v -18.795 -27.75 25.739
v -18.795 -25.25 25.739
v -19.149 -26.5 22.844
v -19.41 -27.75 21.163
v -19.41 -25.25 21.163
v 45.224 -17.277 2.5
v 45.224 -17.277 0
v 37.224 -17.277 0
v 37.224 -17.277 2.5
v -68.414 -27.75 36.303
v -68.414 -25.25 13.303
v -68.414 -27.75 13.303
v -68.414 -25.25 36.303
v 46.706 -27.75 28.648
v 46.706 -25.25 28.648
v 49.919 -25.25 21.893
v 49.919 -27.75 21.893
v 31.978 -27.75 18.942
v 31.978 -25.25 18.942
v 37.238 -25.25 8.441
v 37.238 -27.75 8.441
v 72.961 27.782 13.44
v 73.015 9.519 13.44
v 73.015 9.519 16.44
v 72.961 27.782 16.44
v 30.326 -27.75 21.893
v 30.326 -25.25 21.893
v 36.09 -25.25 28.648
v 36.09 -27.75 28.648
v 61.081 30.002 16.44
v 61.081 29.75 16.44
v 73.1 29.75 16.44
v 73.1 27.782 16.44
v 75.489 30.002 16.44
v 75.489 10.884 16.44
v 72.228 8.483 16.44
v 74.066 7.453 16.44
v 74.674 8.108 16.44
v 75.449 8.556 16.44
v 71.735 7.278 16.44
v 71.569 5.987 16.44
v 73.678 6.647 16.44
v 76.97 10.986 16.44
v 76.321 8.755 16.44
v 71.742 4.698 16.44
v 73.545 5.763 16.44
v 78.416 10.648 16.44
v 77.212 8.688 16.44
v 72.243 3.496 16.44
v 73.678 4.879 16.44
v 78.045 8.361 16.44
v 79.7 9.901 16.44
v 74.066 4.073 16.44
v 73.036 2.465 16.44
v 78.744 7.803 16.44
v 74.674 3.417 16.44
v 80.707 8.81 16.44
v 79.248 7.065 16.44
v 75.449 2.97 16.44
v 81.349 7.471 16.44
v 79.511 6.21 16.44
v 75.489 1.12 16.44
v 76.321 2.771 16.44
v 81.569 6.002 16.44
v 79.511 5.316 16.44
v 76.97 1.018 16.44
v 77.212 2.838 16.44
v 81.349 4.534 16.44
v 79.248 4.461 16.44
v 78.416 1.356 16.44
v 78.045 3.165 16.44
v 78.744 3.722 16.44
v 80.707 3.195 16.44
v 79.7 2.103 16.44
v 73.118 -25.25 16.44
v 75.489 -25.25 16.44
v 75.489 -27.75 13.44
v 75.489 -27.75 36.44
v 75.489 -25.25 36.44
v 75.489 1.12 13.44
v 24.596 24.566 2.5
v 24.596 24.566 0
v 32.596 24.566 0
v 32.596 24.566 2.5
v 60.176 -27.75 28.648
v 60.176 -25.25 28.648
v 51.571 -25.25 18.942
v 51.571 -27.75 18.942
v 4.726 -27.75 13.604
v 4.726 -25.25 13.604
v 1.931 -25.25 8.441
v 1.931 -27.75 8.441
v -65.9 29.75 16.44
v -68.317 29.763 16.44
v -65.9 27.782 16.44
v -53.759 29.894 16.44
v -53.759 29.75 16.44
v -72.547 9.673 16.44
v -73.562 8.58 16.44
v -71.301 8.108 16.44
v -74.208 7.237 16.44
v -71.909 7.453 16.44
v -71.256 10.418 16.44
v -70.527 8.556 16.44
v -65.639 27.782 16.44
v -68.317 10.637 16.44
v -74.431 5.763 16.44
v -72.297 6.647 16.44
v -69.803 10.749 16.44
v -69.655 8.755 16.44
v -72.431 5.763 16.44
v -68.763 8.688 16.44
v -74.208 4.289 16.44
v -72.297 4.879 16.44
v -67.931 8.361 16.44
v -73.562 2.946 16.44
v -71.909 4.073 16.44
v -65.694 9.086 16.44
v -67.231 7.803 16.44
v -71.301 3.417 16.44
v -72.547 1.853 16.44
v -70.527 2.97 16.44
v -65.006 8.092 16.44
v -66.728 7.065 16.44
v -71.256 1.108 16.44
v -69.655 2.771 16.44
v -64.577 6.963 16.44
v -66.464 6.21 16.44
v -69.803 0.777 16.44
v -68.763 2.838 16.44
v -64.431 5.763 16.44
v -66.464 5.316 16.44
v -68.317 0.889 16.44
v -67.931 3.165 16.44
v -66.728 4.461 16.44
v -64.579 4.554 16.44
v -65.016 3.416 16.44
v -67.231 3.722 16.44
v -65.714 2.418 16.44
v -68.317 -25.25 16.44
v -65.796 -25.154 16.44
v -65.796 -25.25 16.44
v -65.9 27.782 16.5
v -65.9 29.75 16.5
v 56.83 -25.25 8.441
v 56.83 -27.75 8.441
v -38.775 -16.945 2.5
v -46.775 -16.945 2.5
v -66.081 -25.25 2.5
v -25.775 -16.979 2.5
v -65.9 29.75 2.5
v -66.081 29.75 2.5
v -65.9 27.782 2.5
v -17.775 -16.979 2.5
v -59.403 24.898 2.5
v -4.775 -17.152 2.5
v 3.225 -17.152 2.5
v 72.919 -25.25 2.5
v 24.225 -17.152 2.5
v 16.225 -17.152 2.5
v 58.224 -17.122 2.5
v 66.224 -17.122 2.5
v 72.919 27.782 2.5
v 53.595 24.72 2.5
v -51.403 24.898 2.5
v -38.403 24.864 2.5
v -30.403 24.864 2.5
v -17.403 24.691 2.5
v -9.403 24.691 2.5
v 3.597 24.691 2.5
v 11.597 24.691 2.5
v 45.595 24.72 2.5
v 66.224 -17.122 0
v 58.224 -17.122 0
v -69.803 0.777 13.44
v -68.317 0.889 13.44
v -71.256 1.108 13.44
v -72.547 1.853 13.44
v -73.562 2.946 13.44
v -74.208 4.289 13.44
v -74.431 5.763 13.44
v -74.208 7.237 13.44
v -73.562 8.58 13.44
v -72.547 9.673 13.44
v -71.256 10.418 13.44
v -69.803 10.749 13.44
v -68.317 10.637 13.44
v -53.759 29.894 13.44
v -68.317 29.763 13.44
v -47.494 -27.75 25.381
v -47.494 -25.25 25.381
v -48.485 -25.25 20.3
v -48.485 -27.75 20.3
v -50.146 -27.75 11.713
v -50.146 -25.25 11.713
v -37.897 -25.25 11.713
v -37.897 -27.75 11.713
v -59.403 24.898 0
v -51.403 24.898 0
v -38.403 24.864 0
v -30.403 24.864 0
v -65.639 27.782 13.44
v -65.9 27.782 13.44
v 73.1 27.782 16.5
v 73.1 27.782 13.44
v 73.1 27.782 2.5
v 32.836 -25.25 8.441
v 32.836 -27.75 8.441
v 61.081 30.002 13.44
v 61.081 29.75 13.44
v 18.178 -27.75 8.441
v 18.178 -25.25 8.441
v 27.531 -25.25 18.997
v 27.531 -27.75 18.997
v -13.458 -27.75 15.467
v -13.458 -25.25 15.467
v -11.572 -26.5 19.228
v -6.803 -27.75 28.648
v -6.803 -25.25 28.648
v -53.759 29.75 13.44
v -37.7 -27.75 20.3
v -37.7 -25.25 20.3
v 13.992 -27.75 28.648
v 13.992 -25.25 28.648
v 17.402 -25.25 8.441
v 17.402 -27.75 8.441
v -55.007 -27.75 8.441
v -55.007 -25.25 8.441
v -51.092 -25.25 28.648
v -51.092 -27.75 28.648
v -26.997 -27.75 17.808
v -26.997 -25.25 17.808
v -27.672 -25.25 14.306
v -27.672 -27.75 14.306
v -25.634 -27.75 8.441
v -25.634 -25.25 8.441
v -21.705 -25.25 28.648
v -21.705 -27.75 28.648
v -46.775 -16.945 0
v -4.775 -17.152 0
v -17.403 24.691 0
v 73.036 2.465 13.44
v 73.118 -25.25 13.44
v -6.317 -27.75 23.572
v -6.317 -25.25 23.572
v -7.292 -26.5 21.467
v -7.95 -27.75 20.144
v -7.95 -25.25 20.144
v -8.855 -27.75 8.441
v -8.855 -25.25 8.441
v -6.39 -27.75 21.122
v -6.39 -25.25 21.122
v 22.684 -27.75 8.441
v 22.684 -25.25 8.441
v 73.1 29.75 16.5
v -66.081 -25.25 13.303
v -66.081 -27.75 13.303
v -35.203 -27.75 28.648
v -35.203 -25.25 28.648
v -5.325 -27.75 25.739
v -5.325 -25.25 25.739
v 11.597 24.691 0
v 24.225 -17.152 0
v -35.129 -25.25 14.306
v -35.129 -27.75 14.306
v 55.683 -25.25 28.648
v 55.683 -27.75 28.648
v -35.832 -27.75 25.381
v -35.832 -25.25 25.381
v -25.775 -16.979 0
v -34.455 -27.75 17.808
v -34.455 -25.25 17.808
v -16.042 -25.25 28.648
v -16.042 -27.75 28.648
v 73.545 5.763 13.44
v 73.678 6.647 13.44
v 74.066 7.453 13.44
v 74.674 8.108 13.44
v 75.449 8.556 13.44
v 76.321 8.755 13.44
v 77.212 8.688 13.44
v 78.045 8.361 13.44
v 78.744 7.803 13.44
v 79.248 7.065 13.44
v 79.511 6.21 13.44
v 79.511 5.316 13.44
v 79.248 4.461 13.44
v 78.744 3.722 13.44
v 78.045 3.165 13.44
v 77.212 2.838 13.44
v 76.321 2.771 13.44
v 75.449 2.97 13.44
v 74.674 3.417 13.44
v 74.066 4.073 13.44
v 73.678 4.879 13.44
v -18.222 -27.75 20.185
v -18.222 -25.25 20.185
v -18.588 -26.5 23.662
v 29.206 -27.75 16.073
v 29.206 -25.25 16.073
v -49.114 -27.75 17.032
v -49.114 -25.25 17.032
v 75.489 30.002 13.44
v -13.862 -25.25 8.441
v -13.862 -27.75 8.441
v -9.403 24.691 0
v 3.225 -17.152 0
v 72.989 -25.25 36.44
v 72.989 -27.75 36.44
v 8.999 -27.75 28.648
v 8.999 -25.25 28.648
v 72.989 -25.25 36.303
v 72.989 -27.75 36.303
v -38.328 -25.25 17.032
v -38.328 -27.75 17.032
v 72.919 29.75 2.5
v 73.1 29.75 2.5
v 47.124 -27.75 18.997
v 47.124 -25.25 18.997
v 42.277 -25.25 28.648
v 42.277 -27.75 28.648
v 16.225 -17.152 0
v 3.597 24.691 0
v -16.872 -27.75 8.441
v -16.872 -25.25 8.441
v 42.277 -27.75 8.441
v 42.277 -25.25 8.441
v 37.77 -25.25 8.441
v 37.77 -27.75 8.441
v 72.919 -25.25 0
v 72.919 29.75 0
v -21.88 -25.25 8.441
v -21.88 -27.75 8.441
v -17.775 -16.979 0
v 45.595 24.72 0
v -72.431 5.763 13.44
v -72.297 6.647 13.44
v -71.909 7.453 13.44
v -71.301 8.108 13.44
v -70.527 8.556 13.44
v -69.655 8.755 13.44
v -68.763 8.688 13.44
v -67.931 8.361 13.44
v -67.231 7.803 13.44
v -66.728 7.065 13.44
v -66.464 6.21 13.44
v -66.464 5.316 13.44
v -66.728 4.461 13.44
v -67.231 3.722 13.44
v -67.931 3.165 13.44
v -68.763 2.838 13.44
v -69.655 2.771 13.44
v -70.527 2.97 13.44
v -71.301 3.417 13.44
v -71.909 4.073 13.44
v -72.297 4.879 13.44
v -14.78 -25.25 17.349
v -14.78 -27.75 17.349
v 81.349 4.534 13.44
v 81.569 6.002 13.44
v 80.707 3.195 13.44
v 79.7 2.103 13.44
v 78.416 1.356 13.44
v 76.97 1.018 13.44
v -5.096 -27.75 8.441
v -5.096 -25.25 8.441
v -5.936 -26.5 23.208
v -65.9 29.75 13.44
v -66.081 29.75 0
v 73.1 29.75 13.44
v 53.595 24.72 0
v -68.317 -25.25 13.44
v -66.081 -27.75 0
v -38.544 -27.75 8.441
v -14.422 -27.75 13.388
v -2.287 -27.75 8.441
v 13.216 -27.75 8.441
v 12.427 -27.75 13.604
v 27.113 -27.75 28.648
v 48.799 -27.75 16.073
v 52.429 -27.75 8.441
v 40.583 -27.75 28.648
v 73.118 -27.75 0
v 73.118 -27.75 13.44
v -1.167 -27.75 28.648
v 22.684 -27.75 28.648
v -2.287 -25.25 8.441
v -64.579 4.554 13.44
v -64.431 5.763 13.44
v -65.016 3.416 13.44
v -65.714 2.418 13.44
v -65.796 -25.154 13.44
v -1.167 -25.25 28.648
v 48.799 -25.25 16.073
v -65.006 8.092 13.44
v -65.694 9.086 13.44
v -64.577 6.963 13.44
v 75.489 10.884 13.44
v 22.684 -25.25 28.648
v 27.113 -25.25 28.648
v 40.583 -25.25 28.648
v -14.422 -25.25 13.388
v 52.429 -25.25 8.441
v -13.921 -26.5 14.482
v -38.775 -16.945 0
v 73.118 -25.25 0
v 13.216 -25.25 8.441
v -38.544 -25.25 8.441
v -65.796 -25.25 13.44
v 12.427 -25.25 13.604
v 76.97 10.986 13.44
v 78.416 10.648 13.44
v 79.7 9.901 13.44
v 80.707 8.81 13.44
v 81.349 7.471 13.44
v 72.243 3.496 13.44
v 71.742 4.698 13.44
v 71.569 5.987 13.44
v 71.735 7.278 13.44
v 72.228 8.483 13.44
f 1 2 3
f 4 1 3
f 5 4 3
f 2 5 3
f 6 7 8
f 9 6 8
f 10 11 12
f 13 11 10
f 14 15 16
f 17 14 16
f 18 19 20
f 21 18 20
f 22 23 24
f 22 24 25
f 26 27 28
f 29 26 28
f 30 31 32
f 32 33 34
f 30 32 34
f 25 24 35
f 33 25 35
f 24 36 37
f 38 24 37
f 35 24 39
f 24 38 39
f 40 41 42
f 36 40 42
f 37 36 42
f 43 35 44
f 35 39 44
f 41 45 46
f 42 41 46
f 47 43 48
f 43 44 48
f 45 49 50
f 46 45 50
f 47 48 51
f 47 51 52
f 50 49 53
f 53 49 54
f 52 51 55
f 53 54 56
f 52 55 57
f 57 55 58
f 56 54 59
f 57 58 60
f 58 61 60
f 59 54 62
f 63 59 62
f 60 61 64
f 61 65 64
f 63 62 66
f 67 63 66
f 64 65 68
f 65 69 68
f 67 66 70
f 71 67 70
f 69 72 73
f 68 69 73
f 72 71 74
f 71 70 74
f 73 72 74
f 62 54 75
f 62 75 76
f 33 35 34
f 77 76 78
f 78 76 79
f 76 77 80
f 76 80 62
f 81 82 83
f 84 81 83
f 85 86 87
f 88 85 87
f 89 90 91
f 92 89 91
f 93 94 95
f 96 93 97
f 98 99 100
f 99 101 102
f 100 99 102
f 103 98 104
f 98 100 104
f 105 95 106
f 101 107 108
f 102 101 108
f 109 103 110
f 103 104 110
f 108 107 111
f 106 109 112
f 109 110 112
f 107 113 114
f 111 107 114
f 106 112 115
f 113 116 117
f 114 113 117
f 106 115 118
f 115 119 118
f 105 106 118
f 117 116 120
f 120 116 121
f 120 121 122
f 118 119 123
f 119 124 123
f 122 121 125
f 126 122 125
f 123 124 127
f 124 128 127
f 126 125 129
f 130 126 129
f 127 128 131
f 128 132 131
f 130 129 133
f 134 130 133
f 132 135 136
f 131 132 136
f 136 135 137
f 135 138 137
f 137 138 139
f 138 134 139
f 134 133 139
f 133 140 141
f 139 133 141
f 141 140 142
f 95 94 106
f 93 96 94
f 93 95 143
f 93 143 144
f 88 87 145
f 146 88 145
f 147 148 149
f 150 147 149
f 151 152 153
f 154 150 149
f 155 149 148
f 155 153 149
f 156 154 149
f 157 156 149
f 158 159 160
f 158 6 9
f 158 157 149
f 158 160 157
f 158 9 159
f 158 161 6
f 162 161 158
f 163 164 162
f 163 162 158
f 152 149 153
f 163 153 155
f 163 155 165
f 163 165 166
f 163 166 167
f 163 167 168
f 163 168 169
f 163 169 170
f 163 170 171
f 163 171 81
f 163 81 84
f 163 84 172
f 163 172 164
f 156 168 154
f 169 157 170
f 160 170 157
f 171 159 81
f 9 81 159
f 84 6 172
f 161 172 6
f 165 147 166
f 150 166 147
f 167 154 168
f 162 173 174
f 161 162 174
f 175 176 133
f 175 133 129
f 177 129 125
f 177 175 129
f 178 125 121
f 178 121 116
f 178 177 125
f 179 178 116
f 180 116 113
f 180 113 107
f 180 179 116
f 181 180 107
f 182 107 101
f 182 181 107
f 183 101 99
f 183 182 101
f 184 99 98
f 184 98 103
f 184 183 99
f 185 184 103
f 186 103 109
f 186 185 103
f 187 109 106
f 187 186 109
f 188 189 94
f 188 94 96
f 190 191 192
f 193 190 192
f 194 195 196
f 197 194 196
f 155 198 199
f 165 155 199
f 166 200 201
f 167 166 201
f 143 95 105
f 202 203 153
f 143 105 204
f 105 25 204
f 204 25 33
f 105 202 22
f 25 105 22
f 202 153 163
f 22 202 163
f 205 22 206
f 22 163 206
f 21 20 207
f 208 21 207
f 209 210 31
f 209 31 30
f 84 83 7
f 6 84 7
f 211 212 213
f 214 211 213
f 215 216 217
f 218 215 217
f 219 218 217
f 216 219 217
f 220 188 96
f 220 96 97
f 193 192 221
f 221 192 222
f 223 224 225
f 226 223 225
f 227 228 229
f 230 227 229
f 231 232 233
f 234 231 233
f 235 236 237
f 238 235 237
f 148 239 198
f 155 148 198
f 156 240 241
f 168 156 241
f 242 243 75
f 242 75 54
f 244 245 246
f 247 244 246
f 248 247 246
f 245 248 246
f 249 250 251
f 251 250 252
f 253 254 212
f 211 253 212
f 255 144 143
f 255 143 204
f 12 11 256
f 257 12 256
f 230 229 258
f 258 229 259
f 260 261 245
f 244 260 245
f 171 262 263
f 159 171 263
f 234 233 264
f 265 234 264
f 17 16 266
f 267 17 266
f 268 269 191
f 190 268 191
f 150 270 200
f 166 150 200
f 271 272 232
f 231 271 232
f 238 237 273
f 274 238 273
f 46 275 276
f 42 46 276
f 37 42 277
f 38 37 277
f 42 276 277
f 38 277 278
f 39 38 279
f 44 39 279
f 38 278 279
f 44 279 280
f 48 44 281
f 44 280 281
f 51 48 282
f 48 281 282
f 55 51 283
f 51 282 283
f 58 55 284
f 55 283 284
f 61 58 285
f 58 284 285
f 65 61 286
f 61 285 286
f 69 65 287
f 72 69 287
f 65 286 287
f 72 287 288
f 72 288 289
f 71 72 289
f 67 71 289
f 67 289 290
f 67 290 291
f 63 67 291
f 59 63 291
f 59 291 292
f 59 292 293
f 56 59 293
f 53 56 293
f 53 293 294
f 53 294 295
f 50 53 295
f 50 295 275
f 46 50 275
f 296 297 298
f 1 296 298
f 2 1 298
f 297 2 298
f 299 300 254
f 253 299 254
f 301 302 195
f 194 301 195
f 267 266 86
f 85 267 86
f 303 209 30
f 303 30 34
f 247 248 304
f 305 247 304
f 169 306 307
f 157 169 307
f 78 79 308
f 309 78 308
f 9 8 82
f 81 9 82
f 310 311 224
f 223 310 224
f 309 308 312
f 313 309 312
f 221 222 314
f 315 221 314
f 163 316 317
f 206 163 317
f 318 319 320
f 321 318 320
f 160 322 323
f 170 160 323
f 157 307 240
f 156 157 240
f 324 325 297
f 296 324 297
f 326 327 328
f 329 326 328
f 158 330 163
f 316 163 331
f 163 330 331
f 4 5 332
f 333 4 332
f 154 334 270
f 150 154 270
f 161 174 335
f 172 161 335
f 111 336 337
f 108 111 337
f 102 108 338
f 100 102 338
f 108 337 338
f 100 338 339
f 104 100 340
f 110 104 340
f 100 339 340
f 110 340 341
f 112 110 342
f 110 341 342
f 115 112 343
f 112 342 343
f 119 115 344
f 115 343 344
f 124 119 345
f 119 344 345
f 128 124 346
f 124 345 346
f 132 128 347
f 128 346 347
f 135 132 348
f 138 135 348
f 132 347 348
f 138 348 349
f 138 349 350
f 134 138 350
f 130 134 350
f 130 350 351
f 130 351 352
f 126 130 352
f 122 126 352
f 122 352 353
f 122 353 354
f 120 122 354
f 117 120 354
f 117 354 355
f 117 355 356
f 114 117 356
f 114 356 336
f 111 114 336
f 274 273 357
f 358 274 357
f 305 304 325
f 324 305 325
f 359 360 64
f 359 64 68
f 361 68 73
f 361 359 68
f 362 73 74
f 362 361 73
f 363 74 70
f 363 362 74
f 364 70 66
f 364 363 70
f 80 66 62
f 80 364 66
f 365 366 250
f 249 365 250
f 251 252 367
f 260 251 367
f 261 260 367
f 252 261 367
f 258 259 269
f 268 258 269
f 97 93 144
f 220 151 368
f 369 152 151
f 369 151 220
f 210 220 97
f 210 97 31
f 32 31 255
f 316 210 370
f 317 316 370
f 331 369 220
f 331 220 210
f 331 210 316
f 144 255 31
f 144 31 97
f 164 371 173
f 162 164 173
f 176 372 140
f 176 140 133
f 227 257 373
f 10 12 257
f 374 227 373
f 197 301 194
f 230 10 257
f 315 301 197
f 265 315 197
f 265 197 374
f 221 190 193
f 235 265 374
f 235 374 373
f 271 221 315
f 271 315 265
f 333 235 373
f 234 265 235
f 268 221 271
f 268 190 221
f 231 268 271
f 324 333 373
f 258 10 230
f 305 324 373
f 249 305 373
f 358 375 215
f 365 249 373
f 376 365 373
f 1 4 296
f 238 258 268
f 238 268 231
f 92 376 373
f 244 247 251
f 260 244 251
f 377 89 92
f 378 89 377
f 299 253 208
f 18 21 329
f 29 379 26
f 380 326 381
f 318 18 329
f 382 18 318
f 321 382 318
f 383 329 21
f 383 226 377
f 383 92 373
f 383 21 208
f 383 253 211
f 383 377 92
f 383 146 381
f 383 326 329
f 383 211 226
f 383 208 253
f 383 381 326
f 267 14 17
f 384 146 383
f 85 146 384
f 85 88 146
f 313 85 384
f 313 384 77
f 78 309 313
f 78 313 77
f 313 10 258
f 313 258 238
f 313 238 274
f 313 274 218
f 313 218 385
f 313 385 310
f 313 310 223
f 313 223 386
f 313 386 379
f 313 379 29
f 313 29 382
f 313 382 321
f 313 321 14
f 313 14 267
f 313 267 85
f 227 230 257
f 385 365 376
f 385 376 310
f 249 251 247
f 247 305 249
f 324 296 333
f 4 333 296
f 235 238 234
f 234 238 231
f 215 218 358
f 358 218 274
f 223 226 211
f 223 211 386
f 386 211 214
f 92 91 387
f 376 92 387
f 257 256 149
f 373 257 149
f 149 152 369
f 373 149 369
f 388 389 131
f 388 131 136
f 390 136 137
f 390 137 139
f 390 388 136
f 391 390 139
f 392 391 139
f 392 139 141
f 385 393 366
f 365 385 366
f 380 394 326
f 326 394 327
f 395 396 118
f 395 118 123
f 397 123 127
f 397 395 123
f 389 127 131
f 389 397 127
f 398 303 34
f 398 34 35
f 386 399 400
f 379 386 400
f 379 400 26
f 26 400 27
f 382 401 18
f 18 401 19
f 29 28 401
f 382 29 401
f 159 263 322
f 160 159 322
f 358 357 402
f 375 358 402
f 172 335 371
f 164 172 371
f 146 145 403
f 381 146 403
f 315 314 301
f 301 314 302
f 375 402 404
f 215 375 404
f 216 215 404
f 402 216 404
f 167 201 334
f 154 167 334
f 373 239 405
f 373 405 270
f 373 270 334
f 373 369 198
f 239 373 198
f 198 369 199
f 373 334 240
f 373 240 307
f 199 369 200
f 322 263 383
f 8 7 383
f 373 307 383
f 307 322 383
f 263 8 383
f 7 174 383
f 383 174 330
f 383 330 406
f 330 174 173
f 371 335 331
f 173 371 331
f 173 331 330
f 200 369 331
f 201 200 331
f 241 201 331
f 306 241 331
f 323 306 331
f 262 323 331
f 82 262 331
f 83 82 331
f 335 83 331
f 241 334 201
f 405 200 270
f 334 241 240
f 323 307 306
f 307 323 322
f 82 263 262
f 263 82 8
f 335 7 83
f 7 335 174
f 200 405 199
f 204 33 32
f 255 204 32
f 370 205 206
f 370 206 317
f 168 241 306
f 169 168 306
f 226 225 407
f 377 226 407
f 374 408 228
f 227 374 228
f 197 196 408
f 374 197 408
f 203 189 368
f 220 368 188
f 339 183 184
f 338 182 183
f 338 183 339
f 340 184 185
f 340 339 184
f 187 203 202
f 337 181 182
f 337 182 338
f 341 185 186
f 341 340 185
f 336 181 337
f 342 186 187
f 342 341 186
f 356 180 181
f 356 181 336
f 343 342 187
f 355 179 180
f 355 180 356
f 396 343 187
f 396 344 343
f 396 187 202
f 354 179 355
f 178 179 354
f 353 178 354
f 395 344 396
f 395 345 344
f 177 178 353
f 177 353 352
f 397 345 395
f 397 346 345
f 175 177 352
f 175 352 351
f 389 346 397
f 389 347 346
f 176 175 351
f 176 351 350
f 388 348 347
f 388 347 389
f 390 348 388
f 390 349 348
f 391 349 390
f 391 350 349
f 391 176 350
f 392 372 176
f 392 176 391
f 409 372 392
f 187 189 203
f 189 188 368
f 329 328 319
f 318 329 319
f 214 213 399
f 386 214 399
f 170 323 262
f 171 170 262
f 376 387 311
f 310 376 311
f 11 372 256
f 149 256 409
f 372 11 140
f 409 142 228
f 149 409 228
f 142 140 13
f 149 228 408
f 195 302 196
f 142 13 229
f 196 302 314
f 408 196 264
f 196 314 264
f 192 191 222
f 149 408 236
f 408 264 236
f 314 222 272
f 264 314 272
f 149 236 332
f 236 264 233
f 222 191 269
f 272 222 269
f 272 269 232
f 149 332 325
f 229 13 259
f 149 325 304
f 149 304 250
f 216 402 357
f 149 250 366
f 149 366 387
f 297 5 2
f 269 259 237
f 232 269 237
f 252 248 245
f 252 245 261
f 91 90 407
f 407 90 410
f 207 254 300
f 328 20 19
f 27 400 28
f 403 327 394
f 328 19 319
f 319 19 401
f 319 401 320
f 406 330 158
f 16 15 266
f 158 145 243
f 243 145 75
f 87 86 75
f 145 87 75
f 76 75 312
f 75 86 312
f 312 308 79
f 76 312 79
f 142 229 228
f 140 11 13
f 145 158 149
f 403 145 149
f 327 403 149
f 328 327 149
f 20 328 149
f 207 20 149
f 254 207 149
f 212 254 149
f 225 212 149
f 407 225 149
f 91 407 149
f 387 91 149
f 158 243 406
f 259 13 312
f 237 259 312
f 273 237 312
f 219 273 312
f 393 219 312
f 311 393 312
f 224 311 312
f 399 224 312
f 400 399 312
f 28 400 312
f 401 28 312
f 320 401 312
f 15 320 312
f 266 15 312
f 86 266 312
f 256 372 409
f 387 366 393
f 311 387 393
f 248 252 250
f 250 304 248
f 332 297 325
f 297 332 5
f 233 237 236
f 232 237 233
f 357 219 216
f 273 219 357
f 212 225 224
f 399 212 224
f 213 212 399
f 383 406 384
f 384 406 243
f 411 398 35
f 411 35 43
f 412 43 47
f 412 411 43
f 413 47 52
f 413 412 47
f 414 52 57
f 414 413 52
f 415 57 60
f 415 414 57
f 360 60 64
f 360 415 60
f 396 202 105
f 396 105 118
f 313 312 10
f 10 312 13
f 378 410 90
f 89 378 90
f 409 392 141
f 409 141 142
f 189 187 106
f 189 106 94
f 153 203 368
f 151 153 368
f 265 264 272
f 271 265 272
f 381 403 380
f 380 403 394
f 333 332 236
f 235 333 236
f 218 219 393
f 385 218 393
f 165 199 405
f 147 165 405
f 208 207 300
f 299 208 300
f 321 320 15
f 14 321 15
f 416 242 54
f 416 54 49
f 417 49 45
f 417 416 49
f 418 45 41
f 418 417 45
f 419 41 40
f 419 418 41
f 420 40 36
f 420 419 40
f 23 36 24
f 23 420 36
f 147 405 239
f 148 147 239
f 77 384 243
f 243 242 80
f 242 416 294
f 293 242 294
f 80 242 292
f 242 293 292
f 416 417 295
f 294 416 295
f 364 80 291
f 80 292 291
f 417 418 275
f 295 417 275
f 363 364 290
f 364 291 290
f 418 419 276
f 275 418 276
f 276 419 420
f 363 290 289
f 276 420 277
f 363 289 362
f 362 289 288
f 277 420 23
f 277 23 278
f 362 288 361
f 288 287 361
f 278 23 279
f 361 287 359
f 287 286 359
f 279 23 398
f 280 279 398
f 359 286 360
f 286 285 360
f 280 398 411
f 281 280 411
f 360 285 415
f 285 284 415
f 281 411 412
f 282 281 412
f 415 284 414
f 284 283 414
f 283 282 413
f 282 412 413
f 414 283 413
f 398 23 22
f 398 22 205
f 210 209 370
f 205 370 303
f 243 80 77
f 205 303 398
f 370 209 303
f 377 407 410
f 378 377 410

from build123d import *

# Parameters (mm, degrees)
F0_W     = 139
F0_H     = 55
F1_DEPTH = 2.5
F2_W     = 2.3327280719
F2_H     = 23
F2_W_2   = 0.1672719281
F2_W_3   = 0.1289593171
F2_H_2   = 22.8627715209
F3_DEPTH = 2.5
F5_DEPTH = 3
F6_W     = 139
F6_H     = 1.9677817641
F7_DEPTH = 14
F9_D     = 6


with BuildPart() as f1:
    # F0 (on Top) → F1 (new body)
    with BuildSketch(Plane.XY):
        with Locations((3.418983344, 2.2497611304)):
            Rectangle(F0_W, F0_H)
        Polygon((-46.7749163508, -16.9449970126), (-59.4031140208, 24.8976889998), (-51.4031140208, 24.8976889998), (-38.7749163508, -16.9449970126), align=None, mode=Mode.SUBTRACT)
        Polygon((-25.7749595437, -16.9785083988), (-38.4031572137, 24.8641776135), (-30.4031572137, 24.8641776135), (-17.7749595437, -16.9785083988), align=None, mode=Mode.SUBTRACT)
        Polygon((-4.7749595437, -17.1519126743), (-17.4031572137, 24.6907733381), (-9.4031572137, 24.6907733381), (3.2250404563, -17.1519126743), align=None, mode=Mode.SUBTRACT)
        Polygon((16.2250404563, -17.1519108117), (3.5968427863, 24.6907752007), (11.5968427863, 24.6907752007), (24.2250404563, -17.1519108117), align=None, mode=Mode.SUBTRACT)
        Polygon((37.2244375112, -17.277115479), (24.5962398412, 24.5655705334), (32.5962398412, 24.5655705334), (45.2244375112, -17.277115479), align=None, mode=Mode.SUBTRACT)
        Polygon((58.2235167211, -17.1223909005), (45.5953190511, 24.7202951119), (53.5953190511, 24.7202951119), (66.2235167211, -17.1223909005), align=None, mode=Mode.SUBTRACT)
    extrude(amount=F1_DEPTH)

    # F2 (on face) → F3 (join)
    with BuildSketch(Plane.XZ.offset(25.2502388696)):
        Polygon((-66.081016656, 13.302537529), (-66.081016656, 0), (73.1178743134, 0), (73.1178743134, 13.4397660082), (72.9889149964, 13.4397660082), (72.9889149964, 36.302537529), (-65.9137447279, 36.302537529), (-65.9137447279, 13.302537529), align=None)
        Polygon((-27.6715531448, 14.3061928175), (-35.129489078, 14.3061928175), (-34.4548327198, 17.8079805818), (-26.9968967865, 17.8079805818), align=None, mode=Mode.SUBTRACT)
        Polygon((-38.5440763607, 8.4408130497), (-55.0066094022, 8.4408130497), (-51.0917667246, 28.6483773044), (-35.2029210626, 28.6483773044), (-35.8316824305, 25.3806539909), (-47.4935994805, 25.3806539909), (-48.4849312723, 20.3000785582), (-37.6996085381, 20.3000785582), (-38.328369906, 17.0323552447), (-49.1136926402, 17.0323552447), (-50.1463299232, 11.7131258622), (-37.8969569966, 11.7131258622), align=None, mode=Mode.SUBTRACT)
        with BuildLine():
            Line((-5.0958073876, 8.4408130497), (-8.8546070979, 8.4408130497))
            Line((-8.8546070979, 8.4408130497), (-6.3900461157, 21.1215988857))
            add(Edge.make_bspline(
                [(-6.3900461157, 21.1215988857), (-6.0137071947, 22.9849354942), (-5.3252823394, 25.7386349157)],
                knots=[0, 0, 0, 1, 1, 1], degree=2))
            Line((-5.3252823394, 25.7386349157), (-6.3166141311, 23.5723913708))
            add(Edge.make_bspline(
                [(-6.3166141311, 23.5723913708), (-7.450220393, 21.0757038953), (-7.9504757879, 20.144035591)],
                knots=[0, 0, 0, 1, 1, 1], degree=2))
            Line((-7.9504757879, 20.144035591), (-13.861750546, 8.4408130497))
            Line((-13.861750546, 8.4408130497), (-16.8724619135, 8.4408130497))
            Line((-16.8724619135, 8.4408130497), (-18.22177463, 20.1853410823))
            add(Edge.make_bspline(
                [(-18.22177463, 20.1853410823), (-18.6669560365, 24.3617852049), (-18.7954620095, 25.7386349157)],
                knots=[0, 0, 0, 1, 1, 1], degree=2))
            add(Edge.make_bspline(
                [(-18.7954620095, 25.7386349157), (-19.1947484256, 22.2368471514), (-19.4104548803, 21.162904377)],
                knots=[0, 0, 0, 1, 1, 1], degree=2))
            Line((-19.4104548803, 21.162904377), (-21.8796053616, 8.4408130497))
            Line((-21.8796053616, 8.4408130497), (-25.6338155729, 8.4408130497))
            Line((-25.6338155729, 8.4408130497), (-21.7052043982, 28.6483773044))
            Line((-21.7052043982, 28.6483773044), (-16.041762588, 28.6483773044))
            Line((-16.041762588, 28.6483773044), (-14.7796503532, 17.3490306782))
            Line((-14.7796503532, 17.3490306782), (-14.4216694284, 13.3882930103))
            add(Edge.make_bspline(
                [(-14.4216694284, 13.3882930103), (-13.9030560373, 14.5356677692), (-13.4578746309, 15.4673360735)],
                knots=[0, 0, 0, 1, 1, 1], degree=2))
            add(Edge.make_bspline(
                [(-13.4578746309, 15.4673360735), (-13.0126932244, 16.3990043778), (-6.8031010289, 28.6483773044)],
                knots=[0, 0, 0, 1, 1, 1], degree=2))
            Line((-6.8031010289, 28.6483773044), (-1.1671962129, 28.6483773044))
            Line((-1.1671962129, 28.6483773044), (-5.0958073876, 8.4408130497))
        make_face(mode=Mode.SUBTRACT)
        Polygon((17.401916886, 8.4408130497), (13.2162937654, 8.4408130497), (12.4268999312, 13.603999465), (4.7257205491, 13.603999465), (1.9307156363, 8.4408130497), (-2.2870339777, 8.4408130497), (8.9985441514, 28.6483773044), (13.9919191024, 28.6483773044), align=None, mode=Mode.SUBTRACT)
        Polygon((27.5309412581, 18.9966608321), (22.6844302763, 28.6483773044), (27.1132968458, 28.6483773044), (30.3259461709, 21.8926347237), (36.0903569599, 28.6483773044), (40.583476516, 28.6483773044), (31.9781658238, 18.9415868436), (37.2377317189, 8.4408130497), (32.8364021435, 8.4408130497), (29.2061084062, 16.0731499462), (22.6844302763, 8.4408130497), (18.1775422231, 8.4408130497), align=None, mode=Mode.SUBTRACT)
        Polygon((47.123512642, 18.9966608321), (42.2770016602, 28.6483773044), (46.7058682298, 28.6483773044), (49.9185175548, 21.8926347237), (55.6829283438, 28.6483773044), (60.1760478999, 28.6483773044), (51.5707372077, 18.9415868436), (56.8303031028, 8.4408130497), (52.4289735274, 8.4408130497), (48.7986797901, 16.0731499462), (42.2770016602, 8.4408130497), (37.770113607, 8.4408130497), align=None, mode=Mode.SUBTRACT)
        with Locations((-67.247380692, 24.802537529)):
            Rectangle(F2_W, F2_H)
        with Locations((-65.997380692, 24.802537529)):
            Rectangle(F2_W_2, F2_H)
        with Locations((73.0533946549, 24.8711517686)):
            Rectangle(F2_W_3, F2_H_2)
        Polygon((73.1178743134, 36.302537529), (73.1178743134, 13.4397660082), (75.4889149964, 13.4397660082), (75.4889149964, 36.4397660082), (72.9889149964, 36.4397660082), (72.9889149964, 36.302537529), align=None)
    extrude(amount=F3_DEPTH)

    # F4 (on face) → F5 (join)
    with BuildSketch(Plane(origin=(0, 0, 13.4397660082), x_dir=(1, 0, 0), z_dir=(0, 0, -1))):
        with BuildLine():
            Line((75.4889149964, 25.2502388696), (75.4889149964, 27.7502388696))
            Line((75.4889149964, 27.7502388696), (73.1178743134, 27.7502388696))
            Line((73.1178743134, 27.7502388696), (73.1178743134, 25.2502388696))
            Line((73.1178743134, 25.2502388696), (73.0357726252, -2.464520624))
            ThreePointArc((73.0357726252, -2.464520624), (74.1664237205, -1.6173558789), (75.4889149964, -1.1202876444))
            Line((75.4889149964, -1.1202876444), (75.4889149964, 25.2502388696))
        make_face()
        with BuildLine():
            ThreePointArc((81.5691593623, -6.0022003956), (79.6995569545, -2.1034043102), (75.4889149964, -1.1202876444))
            Line((75.4889149964, -1.1202876444), (75.4889149964, -10.8841131467))
            ThreePointArc((75.4889149964, -10.8841131467), (79.6995569545, -9.9009964809), (81.5691593623, -6.0022003956))
        make_face()
        with BuildLine():
            Line((75.4889149964, -10.8841131467), (75.4889149964, -1.1202876444))
            ThreePointArc((75.4889149964, -1.1202876444), (74.1664237205, -1.6173558789), (73.0357726252, -2.464520624))
            Line((73.0357726252, -2.464520624), (73.014874911, -9.5188837818))
            ThreePointArc((73.014874911, -9.5188837818), (74.1534447384, -10.3799078842), (75.4889149964, -10.8841131467))
        make_face()
        with BuildLine():
            Line((75.4889149964, -30.0022003956), (75.4889149964, -10.8841131467))
            ThreePointArc((75.4889149964, -10.8841131467), (74.1534447384, -10.3799078842), (73.014874911, -9.5188837818))
            Line((73.014874911, -9.5188837818), (72.9604437947, -27.8929919004))
            Line((72.9604437947, -27.8929919004), (61.0808953643, -27.8929919004))
            Line((61.0808953643, -27.8929919004), (61.0808953643, -30.0022003956))
            Line((61.0808953643, -30.0022003956), (75.4889149964, -30.0022003956))
        make_face()
        with BuildLine():
            Line((73.014874911, -9.5188837818), (73.0357726252, -2.464520624))
            ThreePointArc((73.0357726252, -2.464520624), (71.5691813014, -5.9873885535), (73.014874911, -9.5188837818))
        make_face()
        with BuildLine():
            Line((-68.1669373373, 27.6543483512), (-68.3165375451, 27.5479025488))
            Line((-68.3165375451, 27.5479025488), (-68.3165375451, -0.8886232584))
            ThreePointArc((-68.3165375451, -0.8886232584), (-66.8972077442, -1.452270315), (-65.714216699, -2.4180483823))
            Line((-65.714216699, -2.4180483823), (-65.7958966544, 25.1543483512))
            Line((-65.7958966544, 25.1543483512), (-65.7958966544, 27.6543483512))
            Line((-65.7958966544, 27.6543483512), (-68.1669373373, 27.6543483512))
        make_face()
        with BuildLine():
            ThreePointArc((-65.714216699, -2.4180483823), (-66.8972077442, -1.452270315), (-68.3165375451, -0.8886232584))
            Line((-68.3165375451, -0.8886232584), (-68.3165375451, -10.637216093))
            ThreePointArc((-68.3165375451, -10.637216093), (-66.884449129, -10.0660451489), (-65.6944645318, -9.0857135021))
            Line((-65.6944645318, -9.0857135021), (-65.714216699, -2.4180483823))
        make_face()
        with BuildLine():
            Line((-68.3165375451, -10.637216093), (-68.3165375451, -0.8886232584))
            ThreePointArc((-68.3165375451, -0.8886232584), (-74.4306445579, -5.7629196757), (-68.3165375451, -10.637216093))
        make_face()
        with BuildLine():
            ThreePointArc((-65.6944645318, -9.0857135021), (-66.884449129, -10.0660451489), (-68.3165375451, -10.637216093))
            Line((-68.3165375451, -10.637216093), (-68.3165375451, -29.7629196757))
            Line((-68.3165375451, -29.7629196757), (-53.7589177052, -29.8940964603))
            Line((-53.7589177052, -29.8940964603), (-53.7589177052, -27.9888824189))
            Line((-53.7589177052, -27.9888824189), (-61.1505493085, -27.9888824189))
            Line((-61.1505493085, -27.9888824189), (-65.6384661357, -27.9888824189))
            Line((-65.6384661357, -27.9888824189), (-65.6944645318, -9.0857135021))
        make_face()
        with BuildLine():
            ThreePointArc((-64.4306445579, -5.7629196757), (-64.7625539796, -3.9715709233), (-65.714216699, -2.4180483823))
            Line((-65.714216699, -2.4180483823), (-65.6944645318, -9.0857135021))
            ThreePointArc((-65.6944645318, -9.0857135021), (-64.7572678274, -7.5404319639), (-64.4306445579, -5.7629196757))
        make_face()
    extrude(amount=-F5_DEPTH)

    # F6 (on face) → F7 (join)
    with BuildSketch(Plane.XY.offset(2.5)):
        with Locations((3.5998241897, 28.7658702483)):
            Rectangle(F6_W, F6_H)
    extrude(amount=F7_DEPTH)

    # F9 (through all)
    with Locations(Plane.XY.offset(16.4397660082)):
        with Locations((-69.4306445579, 5.7629196757), (76.5447840095, 5.7629196757)):
            Hole(F9_D / 2)


solid = f1.part
